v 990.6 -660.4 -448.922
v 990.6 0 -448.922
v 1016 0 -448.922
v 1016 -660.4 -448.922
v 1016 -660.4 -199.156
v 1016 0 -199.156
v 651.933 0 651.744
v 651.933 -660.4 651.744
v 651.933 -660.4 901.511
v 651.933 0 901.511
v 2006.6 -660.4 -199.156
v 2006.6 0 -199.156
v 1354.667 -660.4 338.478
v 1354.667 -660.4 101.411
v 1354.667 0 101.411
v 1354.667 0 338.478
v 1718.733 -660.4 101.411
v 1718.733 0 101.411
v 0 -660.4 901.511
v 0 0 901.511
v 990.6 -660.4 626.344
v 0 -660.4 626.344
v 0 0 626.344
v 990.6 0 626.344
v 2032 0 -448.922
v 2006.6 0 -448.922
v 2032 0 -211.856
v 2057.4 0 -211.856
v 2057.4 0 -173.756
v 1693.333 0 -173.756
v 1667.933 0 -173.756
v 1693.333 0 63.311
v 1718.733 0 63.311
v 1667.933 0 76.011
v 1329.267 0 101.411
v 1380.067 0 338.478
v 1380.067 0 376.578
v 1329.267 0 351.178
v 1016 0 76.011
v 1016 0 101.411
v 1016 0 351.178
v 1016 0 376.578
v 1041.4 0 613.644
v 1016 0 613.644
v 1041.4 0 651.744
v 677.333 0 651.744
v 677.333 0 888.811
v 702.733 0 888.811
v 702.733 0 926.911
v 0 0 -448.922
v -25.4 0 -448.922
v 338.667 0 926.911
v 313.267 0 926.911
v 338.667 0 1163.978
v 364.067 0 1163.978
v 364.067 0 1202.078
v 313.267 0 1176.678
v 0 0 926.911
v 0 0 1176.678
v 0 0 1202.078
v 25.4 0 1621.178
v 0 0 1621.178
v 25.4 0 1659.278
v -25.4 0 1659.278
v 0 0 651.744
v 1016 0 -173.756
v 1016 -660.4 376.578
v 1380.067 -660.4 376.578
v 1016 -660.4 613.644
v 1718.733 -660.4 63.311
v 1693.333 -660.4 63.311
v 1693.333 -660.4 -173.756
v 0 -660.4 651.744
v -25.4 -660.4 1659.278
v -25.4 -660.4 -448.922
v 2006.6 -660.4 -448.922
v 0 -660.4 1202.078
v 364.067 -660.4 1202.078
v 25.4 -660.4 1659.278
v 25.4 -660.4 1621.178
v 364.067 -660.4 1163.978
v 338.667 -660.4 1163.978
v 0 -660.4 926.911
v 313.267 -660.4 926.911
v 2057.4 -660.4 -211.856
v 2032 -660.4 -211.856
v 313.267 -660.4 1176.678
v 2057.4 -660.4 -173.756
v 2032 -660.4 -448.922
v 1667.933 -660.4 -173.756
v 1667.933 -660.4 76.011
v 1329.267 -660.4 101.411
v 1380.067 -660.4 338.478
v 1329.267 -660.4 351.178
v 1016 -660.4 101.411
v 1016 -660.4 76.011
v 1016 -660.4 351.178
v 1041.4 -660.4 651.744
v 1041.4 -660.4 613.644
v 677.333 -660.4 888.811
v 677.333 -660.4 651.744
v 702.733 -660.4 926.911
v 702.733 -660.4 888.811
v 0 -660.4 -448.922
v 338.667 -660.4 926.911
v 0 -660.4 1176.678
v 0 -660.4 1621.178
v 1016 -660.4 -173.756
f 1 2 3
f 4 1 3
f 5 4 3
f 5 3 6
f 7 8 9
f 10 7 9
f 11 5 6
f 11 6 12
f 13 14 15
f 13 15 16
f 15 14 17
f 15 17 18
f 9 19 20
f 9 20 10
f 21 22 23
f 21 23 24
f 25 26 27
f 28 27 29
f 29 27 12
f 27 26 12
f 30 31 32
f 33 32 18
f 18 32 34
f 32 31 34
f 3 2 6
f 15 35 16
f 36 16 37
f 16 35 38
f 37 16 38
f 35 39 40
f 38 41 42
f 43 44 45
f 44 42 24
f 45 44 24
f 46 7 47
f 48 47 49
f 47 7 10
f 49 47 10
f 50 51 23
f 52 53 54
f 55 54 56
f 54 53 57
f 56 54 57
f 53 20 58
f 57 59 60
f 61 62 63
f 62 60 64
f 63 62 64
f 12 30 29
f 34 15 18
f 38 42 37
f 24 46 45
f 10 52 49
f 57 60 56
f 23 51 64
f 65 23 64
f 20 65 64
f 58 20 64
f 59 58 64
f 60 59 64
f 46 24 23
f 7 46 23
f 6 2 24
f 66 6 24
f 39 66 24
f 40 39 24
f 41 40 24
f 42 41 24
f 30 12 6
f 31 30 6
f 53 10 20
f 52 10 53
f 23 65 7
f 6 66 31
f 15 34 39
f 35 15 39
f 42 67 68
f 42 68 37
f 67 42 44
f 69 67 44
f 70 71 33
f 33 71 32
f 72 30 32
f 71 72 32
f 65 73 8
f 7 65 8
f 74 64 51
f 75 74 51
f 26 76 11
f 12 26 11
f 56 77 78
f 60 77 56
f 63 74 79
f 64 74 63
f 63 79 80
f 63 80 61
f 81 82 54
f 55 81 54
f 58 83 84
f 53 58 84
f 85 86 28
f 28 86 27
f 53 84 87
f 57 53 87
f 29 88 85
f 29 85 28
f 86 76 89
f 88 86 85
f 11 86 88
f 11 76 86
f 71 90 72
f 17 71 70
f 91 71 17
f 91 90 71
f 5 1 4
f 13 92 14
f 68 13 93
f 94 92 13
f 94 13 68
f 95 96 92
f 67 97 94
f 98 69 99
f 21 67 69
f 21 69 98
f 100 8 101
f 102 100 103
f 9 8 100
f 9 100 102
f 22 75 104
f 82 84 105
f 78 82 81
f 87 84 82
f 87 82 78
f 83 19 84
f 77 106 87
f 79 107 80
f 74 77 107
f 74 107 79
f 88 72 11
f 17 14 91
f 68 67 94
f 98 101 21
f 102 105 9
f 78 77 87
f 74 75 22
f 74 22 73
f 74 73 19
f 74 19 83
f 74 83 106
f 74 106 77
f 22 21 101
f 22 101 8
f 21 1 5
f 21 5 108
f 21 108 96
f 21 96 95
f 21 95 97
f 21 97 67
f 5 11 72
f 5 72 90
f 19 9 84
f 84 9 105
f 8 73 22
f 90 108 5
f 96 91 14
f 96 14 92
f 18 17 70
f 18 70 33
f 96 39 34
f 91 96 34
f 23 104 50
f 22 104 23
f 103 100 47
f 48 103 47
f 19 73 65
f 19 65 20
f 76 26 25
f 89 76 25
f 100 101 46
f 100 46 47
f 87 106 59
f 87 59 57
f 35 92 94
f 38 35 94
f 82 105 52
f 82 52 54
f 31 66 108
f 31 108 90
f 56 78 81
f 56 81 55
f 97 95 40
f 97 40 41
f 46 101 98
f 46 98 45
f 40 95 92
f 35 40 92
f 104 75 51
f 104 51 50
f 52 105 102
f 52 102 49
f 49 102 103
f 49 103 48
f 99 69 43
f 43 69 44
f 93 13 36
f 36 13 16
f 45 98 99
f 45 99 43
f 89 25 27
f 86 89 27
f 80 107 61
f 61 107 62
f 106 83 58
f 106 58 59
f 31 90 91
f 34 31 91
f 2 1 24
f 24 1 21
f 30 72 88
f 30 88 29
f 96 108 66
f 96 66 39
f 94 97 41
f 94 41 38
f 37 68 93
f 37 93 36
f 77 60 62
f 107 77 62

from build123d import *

# Parameters (mm, degrees)
F1_DEPTH  = 660.4
F2_W      = 313.26666582
F2_H      = 249.76666582
F2_W_2    = 651.93333164
F2_W_3    = 990.59999746
F2_H_2    = 1075.26666328
F2_W_4    = 990.60000254
F3_DEPTH  = 660.4
F4_W      = 660.4
F4_H      = 38.1
F5_DEPTH  = 25.4
F6_W      = 660.4
F6_H      = 38.1
F7_DEPTH  = 25.4
F8_W      = 660.4
F8_H      = 38.1
F9_DEPTH  = 25.4
F10_W     = 660.4
F10_H     = 38.1
F11_DEPTH = 25.4
F12_W     = 660.4
F12_H     = 38.1
F13_DEPTH = 25.4
F14_W     = 660.4
F14_H     = 38.1
F15_DEPTH = 25.4
F16_W     = 660.4
F16_H     = 38.1
F17_DEPTH = 25.4


with BuildPart() as f1:
    # F0 (on Front) → F1 (new body)
    with BuildSketch(Plane.XZ):
        Polygon((0, 1202.077542445), (0, 1659.277547525), (-25.4, 1659.277547525), (-25.4, -448.922452475), (0, -448.922452475), align=None)
        Polygon((338.66666582, 1202.077542445), (0, 1202.077542445), (0, -448.922452475), (2032, -448.922452475), (2032, -173.755786655), (1693.3333291, -173.755786655), (1693.3333291, 101.410879165), (1354.66666328, 101.410879165), (1354.66666328, 376.577544985), (1015.99999746, 376.577544985), (1015.99999746, 651.744210805), (677.33333164, 651.744210805), (677.33333164, 926.910876625), (338.66666582, 926.910876625), align=None)
    extrude(amount=F1_DEPTH)

    # F2 (on face) → F3 (cut)
    with BuildSketch(Plane.XZ.offset(660.4)):
        with Locations((156.63333291, 1051.794209535)):
            Rectangle(F2_W, F2_H)
        with Locations((325.96666582, 776.627543715)):
            Rectangle(F2_W_2, F2_H)
        with Locations((495.29999873, 88.710879165)):
            Rectangle(F2_W_3, F2_H_2)
        with Locations((1172.63333037, 226.294212075)):
            Rectangle(F2_W, F2_H)
        with Locations((1341.96666328, -48.872453745)):
            Rectangle(F2_W_2, F2_H)
        with Locations((1511.29999873, -324.039119565)):
            Rectangle(F2_W_4, F2_H)
    extrude(amount=-F3_DEPTH, mode=Mode.SUBTRACT)

    # F4 (on face) → F5 (join)
    with BuildSketch(Plane.YZ):
        with Locations((-330.2, 1640.227547525)):
            Rectangle(F4_W, F4_H)
    extrude(amount=F5_DEPTH)

    # F6 (on face) → F7 (join)
    with BuildSketch(Plane.YZ.offset(338.66666582)):
        with Locations((-330.2, 1183.027542445)):
            Rectangle(F6_W, F6_H)
    extrude(amount=F7_DEPTH)

    # F8 (on face) → F9 (join)
    with BuildSketch(Plane.YZ.offset(677.33333164)):
        with Locations((-330.2, 907.860876625)):
            Rectangle(F8_W, F8_H)
    extrude(amount=F9_DEPTH)

    # F10 (on face) → F11 (join)
    with BuildSketch(Plane.YZ.offset(1015.99999746)):
        with Locations((-330.2, 632.694210805)):
            Rectangle(F10_W, F10_H)
    extrude(amount=F11_DEPTH)

    # F12 (on face) → F13 (join)
    with BuildSketch(Plane.YZ.offset(1354.66666328)):
        with Locations((-330.2, 357.527544985)):
            Rectangle(F12_W, F12_H)
    extrude(amount=F13_DEPTH)

    # F14 (on face) → F15 (join)
    with BuildSketch(Plane.YZ.offset(1693.3333291)):
        with Locations((-330.2, 82.360879165)):
            Rectangle(F14_W, F14_H)
    extrude(amount=F15_DEPTH)

    # F16 (on face) → F17 (join)
    with BuildSketch(Plane.YZ.offset(2032)):
        with Locations((-330.2, -192.805786655)):
            Rectangle(F16_W, F16_H)
    extrude(amount=F17_DEPTH)


solid = f1.part
